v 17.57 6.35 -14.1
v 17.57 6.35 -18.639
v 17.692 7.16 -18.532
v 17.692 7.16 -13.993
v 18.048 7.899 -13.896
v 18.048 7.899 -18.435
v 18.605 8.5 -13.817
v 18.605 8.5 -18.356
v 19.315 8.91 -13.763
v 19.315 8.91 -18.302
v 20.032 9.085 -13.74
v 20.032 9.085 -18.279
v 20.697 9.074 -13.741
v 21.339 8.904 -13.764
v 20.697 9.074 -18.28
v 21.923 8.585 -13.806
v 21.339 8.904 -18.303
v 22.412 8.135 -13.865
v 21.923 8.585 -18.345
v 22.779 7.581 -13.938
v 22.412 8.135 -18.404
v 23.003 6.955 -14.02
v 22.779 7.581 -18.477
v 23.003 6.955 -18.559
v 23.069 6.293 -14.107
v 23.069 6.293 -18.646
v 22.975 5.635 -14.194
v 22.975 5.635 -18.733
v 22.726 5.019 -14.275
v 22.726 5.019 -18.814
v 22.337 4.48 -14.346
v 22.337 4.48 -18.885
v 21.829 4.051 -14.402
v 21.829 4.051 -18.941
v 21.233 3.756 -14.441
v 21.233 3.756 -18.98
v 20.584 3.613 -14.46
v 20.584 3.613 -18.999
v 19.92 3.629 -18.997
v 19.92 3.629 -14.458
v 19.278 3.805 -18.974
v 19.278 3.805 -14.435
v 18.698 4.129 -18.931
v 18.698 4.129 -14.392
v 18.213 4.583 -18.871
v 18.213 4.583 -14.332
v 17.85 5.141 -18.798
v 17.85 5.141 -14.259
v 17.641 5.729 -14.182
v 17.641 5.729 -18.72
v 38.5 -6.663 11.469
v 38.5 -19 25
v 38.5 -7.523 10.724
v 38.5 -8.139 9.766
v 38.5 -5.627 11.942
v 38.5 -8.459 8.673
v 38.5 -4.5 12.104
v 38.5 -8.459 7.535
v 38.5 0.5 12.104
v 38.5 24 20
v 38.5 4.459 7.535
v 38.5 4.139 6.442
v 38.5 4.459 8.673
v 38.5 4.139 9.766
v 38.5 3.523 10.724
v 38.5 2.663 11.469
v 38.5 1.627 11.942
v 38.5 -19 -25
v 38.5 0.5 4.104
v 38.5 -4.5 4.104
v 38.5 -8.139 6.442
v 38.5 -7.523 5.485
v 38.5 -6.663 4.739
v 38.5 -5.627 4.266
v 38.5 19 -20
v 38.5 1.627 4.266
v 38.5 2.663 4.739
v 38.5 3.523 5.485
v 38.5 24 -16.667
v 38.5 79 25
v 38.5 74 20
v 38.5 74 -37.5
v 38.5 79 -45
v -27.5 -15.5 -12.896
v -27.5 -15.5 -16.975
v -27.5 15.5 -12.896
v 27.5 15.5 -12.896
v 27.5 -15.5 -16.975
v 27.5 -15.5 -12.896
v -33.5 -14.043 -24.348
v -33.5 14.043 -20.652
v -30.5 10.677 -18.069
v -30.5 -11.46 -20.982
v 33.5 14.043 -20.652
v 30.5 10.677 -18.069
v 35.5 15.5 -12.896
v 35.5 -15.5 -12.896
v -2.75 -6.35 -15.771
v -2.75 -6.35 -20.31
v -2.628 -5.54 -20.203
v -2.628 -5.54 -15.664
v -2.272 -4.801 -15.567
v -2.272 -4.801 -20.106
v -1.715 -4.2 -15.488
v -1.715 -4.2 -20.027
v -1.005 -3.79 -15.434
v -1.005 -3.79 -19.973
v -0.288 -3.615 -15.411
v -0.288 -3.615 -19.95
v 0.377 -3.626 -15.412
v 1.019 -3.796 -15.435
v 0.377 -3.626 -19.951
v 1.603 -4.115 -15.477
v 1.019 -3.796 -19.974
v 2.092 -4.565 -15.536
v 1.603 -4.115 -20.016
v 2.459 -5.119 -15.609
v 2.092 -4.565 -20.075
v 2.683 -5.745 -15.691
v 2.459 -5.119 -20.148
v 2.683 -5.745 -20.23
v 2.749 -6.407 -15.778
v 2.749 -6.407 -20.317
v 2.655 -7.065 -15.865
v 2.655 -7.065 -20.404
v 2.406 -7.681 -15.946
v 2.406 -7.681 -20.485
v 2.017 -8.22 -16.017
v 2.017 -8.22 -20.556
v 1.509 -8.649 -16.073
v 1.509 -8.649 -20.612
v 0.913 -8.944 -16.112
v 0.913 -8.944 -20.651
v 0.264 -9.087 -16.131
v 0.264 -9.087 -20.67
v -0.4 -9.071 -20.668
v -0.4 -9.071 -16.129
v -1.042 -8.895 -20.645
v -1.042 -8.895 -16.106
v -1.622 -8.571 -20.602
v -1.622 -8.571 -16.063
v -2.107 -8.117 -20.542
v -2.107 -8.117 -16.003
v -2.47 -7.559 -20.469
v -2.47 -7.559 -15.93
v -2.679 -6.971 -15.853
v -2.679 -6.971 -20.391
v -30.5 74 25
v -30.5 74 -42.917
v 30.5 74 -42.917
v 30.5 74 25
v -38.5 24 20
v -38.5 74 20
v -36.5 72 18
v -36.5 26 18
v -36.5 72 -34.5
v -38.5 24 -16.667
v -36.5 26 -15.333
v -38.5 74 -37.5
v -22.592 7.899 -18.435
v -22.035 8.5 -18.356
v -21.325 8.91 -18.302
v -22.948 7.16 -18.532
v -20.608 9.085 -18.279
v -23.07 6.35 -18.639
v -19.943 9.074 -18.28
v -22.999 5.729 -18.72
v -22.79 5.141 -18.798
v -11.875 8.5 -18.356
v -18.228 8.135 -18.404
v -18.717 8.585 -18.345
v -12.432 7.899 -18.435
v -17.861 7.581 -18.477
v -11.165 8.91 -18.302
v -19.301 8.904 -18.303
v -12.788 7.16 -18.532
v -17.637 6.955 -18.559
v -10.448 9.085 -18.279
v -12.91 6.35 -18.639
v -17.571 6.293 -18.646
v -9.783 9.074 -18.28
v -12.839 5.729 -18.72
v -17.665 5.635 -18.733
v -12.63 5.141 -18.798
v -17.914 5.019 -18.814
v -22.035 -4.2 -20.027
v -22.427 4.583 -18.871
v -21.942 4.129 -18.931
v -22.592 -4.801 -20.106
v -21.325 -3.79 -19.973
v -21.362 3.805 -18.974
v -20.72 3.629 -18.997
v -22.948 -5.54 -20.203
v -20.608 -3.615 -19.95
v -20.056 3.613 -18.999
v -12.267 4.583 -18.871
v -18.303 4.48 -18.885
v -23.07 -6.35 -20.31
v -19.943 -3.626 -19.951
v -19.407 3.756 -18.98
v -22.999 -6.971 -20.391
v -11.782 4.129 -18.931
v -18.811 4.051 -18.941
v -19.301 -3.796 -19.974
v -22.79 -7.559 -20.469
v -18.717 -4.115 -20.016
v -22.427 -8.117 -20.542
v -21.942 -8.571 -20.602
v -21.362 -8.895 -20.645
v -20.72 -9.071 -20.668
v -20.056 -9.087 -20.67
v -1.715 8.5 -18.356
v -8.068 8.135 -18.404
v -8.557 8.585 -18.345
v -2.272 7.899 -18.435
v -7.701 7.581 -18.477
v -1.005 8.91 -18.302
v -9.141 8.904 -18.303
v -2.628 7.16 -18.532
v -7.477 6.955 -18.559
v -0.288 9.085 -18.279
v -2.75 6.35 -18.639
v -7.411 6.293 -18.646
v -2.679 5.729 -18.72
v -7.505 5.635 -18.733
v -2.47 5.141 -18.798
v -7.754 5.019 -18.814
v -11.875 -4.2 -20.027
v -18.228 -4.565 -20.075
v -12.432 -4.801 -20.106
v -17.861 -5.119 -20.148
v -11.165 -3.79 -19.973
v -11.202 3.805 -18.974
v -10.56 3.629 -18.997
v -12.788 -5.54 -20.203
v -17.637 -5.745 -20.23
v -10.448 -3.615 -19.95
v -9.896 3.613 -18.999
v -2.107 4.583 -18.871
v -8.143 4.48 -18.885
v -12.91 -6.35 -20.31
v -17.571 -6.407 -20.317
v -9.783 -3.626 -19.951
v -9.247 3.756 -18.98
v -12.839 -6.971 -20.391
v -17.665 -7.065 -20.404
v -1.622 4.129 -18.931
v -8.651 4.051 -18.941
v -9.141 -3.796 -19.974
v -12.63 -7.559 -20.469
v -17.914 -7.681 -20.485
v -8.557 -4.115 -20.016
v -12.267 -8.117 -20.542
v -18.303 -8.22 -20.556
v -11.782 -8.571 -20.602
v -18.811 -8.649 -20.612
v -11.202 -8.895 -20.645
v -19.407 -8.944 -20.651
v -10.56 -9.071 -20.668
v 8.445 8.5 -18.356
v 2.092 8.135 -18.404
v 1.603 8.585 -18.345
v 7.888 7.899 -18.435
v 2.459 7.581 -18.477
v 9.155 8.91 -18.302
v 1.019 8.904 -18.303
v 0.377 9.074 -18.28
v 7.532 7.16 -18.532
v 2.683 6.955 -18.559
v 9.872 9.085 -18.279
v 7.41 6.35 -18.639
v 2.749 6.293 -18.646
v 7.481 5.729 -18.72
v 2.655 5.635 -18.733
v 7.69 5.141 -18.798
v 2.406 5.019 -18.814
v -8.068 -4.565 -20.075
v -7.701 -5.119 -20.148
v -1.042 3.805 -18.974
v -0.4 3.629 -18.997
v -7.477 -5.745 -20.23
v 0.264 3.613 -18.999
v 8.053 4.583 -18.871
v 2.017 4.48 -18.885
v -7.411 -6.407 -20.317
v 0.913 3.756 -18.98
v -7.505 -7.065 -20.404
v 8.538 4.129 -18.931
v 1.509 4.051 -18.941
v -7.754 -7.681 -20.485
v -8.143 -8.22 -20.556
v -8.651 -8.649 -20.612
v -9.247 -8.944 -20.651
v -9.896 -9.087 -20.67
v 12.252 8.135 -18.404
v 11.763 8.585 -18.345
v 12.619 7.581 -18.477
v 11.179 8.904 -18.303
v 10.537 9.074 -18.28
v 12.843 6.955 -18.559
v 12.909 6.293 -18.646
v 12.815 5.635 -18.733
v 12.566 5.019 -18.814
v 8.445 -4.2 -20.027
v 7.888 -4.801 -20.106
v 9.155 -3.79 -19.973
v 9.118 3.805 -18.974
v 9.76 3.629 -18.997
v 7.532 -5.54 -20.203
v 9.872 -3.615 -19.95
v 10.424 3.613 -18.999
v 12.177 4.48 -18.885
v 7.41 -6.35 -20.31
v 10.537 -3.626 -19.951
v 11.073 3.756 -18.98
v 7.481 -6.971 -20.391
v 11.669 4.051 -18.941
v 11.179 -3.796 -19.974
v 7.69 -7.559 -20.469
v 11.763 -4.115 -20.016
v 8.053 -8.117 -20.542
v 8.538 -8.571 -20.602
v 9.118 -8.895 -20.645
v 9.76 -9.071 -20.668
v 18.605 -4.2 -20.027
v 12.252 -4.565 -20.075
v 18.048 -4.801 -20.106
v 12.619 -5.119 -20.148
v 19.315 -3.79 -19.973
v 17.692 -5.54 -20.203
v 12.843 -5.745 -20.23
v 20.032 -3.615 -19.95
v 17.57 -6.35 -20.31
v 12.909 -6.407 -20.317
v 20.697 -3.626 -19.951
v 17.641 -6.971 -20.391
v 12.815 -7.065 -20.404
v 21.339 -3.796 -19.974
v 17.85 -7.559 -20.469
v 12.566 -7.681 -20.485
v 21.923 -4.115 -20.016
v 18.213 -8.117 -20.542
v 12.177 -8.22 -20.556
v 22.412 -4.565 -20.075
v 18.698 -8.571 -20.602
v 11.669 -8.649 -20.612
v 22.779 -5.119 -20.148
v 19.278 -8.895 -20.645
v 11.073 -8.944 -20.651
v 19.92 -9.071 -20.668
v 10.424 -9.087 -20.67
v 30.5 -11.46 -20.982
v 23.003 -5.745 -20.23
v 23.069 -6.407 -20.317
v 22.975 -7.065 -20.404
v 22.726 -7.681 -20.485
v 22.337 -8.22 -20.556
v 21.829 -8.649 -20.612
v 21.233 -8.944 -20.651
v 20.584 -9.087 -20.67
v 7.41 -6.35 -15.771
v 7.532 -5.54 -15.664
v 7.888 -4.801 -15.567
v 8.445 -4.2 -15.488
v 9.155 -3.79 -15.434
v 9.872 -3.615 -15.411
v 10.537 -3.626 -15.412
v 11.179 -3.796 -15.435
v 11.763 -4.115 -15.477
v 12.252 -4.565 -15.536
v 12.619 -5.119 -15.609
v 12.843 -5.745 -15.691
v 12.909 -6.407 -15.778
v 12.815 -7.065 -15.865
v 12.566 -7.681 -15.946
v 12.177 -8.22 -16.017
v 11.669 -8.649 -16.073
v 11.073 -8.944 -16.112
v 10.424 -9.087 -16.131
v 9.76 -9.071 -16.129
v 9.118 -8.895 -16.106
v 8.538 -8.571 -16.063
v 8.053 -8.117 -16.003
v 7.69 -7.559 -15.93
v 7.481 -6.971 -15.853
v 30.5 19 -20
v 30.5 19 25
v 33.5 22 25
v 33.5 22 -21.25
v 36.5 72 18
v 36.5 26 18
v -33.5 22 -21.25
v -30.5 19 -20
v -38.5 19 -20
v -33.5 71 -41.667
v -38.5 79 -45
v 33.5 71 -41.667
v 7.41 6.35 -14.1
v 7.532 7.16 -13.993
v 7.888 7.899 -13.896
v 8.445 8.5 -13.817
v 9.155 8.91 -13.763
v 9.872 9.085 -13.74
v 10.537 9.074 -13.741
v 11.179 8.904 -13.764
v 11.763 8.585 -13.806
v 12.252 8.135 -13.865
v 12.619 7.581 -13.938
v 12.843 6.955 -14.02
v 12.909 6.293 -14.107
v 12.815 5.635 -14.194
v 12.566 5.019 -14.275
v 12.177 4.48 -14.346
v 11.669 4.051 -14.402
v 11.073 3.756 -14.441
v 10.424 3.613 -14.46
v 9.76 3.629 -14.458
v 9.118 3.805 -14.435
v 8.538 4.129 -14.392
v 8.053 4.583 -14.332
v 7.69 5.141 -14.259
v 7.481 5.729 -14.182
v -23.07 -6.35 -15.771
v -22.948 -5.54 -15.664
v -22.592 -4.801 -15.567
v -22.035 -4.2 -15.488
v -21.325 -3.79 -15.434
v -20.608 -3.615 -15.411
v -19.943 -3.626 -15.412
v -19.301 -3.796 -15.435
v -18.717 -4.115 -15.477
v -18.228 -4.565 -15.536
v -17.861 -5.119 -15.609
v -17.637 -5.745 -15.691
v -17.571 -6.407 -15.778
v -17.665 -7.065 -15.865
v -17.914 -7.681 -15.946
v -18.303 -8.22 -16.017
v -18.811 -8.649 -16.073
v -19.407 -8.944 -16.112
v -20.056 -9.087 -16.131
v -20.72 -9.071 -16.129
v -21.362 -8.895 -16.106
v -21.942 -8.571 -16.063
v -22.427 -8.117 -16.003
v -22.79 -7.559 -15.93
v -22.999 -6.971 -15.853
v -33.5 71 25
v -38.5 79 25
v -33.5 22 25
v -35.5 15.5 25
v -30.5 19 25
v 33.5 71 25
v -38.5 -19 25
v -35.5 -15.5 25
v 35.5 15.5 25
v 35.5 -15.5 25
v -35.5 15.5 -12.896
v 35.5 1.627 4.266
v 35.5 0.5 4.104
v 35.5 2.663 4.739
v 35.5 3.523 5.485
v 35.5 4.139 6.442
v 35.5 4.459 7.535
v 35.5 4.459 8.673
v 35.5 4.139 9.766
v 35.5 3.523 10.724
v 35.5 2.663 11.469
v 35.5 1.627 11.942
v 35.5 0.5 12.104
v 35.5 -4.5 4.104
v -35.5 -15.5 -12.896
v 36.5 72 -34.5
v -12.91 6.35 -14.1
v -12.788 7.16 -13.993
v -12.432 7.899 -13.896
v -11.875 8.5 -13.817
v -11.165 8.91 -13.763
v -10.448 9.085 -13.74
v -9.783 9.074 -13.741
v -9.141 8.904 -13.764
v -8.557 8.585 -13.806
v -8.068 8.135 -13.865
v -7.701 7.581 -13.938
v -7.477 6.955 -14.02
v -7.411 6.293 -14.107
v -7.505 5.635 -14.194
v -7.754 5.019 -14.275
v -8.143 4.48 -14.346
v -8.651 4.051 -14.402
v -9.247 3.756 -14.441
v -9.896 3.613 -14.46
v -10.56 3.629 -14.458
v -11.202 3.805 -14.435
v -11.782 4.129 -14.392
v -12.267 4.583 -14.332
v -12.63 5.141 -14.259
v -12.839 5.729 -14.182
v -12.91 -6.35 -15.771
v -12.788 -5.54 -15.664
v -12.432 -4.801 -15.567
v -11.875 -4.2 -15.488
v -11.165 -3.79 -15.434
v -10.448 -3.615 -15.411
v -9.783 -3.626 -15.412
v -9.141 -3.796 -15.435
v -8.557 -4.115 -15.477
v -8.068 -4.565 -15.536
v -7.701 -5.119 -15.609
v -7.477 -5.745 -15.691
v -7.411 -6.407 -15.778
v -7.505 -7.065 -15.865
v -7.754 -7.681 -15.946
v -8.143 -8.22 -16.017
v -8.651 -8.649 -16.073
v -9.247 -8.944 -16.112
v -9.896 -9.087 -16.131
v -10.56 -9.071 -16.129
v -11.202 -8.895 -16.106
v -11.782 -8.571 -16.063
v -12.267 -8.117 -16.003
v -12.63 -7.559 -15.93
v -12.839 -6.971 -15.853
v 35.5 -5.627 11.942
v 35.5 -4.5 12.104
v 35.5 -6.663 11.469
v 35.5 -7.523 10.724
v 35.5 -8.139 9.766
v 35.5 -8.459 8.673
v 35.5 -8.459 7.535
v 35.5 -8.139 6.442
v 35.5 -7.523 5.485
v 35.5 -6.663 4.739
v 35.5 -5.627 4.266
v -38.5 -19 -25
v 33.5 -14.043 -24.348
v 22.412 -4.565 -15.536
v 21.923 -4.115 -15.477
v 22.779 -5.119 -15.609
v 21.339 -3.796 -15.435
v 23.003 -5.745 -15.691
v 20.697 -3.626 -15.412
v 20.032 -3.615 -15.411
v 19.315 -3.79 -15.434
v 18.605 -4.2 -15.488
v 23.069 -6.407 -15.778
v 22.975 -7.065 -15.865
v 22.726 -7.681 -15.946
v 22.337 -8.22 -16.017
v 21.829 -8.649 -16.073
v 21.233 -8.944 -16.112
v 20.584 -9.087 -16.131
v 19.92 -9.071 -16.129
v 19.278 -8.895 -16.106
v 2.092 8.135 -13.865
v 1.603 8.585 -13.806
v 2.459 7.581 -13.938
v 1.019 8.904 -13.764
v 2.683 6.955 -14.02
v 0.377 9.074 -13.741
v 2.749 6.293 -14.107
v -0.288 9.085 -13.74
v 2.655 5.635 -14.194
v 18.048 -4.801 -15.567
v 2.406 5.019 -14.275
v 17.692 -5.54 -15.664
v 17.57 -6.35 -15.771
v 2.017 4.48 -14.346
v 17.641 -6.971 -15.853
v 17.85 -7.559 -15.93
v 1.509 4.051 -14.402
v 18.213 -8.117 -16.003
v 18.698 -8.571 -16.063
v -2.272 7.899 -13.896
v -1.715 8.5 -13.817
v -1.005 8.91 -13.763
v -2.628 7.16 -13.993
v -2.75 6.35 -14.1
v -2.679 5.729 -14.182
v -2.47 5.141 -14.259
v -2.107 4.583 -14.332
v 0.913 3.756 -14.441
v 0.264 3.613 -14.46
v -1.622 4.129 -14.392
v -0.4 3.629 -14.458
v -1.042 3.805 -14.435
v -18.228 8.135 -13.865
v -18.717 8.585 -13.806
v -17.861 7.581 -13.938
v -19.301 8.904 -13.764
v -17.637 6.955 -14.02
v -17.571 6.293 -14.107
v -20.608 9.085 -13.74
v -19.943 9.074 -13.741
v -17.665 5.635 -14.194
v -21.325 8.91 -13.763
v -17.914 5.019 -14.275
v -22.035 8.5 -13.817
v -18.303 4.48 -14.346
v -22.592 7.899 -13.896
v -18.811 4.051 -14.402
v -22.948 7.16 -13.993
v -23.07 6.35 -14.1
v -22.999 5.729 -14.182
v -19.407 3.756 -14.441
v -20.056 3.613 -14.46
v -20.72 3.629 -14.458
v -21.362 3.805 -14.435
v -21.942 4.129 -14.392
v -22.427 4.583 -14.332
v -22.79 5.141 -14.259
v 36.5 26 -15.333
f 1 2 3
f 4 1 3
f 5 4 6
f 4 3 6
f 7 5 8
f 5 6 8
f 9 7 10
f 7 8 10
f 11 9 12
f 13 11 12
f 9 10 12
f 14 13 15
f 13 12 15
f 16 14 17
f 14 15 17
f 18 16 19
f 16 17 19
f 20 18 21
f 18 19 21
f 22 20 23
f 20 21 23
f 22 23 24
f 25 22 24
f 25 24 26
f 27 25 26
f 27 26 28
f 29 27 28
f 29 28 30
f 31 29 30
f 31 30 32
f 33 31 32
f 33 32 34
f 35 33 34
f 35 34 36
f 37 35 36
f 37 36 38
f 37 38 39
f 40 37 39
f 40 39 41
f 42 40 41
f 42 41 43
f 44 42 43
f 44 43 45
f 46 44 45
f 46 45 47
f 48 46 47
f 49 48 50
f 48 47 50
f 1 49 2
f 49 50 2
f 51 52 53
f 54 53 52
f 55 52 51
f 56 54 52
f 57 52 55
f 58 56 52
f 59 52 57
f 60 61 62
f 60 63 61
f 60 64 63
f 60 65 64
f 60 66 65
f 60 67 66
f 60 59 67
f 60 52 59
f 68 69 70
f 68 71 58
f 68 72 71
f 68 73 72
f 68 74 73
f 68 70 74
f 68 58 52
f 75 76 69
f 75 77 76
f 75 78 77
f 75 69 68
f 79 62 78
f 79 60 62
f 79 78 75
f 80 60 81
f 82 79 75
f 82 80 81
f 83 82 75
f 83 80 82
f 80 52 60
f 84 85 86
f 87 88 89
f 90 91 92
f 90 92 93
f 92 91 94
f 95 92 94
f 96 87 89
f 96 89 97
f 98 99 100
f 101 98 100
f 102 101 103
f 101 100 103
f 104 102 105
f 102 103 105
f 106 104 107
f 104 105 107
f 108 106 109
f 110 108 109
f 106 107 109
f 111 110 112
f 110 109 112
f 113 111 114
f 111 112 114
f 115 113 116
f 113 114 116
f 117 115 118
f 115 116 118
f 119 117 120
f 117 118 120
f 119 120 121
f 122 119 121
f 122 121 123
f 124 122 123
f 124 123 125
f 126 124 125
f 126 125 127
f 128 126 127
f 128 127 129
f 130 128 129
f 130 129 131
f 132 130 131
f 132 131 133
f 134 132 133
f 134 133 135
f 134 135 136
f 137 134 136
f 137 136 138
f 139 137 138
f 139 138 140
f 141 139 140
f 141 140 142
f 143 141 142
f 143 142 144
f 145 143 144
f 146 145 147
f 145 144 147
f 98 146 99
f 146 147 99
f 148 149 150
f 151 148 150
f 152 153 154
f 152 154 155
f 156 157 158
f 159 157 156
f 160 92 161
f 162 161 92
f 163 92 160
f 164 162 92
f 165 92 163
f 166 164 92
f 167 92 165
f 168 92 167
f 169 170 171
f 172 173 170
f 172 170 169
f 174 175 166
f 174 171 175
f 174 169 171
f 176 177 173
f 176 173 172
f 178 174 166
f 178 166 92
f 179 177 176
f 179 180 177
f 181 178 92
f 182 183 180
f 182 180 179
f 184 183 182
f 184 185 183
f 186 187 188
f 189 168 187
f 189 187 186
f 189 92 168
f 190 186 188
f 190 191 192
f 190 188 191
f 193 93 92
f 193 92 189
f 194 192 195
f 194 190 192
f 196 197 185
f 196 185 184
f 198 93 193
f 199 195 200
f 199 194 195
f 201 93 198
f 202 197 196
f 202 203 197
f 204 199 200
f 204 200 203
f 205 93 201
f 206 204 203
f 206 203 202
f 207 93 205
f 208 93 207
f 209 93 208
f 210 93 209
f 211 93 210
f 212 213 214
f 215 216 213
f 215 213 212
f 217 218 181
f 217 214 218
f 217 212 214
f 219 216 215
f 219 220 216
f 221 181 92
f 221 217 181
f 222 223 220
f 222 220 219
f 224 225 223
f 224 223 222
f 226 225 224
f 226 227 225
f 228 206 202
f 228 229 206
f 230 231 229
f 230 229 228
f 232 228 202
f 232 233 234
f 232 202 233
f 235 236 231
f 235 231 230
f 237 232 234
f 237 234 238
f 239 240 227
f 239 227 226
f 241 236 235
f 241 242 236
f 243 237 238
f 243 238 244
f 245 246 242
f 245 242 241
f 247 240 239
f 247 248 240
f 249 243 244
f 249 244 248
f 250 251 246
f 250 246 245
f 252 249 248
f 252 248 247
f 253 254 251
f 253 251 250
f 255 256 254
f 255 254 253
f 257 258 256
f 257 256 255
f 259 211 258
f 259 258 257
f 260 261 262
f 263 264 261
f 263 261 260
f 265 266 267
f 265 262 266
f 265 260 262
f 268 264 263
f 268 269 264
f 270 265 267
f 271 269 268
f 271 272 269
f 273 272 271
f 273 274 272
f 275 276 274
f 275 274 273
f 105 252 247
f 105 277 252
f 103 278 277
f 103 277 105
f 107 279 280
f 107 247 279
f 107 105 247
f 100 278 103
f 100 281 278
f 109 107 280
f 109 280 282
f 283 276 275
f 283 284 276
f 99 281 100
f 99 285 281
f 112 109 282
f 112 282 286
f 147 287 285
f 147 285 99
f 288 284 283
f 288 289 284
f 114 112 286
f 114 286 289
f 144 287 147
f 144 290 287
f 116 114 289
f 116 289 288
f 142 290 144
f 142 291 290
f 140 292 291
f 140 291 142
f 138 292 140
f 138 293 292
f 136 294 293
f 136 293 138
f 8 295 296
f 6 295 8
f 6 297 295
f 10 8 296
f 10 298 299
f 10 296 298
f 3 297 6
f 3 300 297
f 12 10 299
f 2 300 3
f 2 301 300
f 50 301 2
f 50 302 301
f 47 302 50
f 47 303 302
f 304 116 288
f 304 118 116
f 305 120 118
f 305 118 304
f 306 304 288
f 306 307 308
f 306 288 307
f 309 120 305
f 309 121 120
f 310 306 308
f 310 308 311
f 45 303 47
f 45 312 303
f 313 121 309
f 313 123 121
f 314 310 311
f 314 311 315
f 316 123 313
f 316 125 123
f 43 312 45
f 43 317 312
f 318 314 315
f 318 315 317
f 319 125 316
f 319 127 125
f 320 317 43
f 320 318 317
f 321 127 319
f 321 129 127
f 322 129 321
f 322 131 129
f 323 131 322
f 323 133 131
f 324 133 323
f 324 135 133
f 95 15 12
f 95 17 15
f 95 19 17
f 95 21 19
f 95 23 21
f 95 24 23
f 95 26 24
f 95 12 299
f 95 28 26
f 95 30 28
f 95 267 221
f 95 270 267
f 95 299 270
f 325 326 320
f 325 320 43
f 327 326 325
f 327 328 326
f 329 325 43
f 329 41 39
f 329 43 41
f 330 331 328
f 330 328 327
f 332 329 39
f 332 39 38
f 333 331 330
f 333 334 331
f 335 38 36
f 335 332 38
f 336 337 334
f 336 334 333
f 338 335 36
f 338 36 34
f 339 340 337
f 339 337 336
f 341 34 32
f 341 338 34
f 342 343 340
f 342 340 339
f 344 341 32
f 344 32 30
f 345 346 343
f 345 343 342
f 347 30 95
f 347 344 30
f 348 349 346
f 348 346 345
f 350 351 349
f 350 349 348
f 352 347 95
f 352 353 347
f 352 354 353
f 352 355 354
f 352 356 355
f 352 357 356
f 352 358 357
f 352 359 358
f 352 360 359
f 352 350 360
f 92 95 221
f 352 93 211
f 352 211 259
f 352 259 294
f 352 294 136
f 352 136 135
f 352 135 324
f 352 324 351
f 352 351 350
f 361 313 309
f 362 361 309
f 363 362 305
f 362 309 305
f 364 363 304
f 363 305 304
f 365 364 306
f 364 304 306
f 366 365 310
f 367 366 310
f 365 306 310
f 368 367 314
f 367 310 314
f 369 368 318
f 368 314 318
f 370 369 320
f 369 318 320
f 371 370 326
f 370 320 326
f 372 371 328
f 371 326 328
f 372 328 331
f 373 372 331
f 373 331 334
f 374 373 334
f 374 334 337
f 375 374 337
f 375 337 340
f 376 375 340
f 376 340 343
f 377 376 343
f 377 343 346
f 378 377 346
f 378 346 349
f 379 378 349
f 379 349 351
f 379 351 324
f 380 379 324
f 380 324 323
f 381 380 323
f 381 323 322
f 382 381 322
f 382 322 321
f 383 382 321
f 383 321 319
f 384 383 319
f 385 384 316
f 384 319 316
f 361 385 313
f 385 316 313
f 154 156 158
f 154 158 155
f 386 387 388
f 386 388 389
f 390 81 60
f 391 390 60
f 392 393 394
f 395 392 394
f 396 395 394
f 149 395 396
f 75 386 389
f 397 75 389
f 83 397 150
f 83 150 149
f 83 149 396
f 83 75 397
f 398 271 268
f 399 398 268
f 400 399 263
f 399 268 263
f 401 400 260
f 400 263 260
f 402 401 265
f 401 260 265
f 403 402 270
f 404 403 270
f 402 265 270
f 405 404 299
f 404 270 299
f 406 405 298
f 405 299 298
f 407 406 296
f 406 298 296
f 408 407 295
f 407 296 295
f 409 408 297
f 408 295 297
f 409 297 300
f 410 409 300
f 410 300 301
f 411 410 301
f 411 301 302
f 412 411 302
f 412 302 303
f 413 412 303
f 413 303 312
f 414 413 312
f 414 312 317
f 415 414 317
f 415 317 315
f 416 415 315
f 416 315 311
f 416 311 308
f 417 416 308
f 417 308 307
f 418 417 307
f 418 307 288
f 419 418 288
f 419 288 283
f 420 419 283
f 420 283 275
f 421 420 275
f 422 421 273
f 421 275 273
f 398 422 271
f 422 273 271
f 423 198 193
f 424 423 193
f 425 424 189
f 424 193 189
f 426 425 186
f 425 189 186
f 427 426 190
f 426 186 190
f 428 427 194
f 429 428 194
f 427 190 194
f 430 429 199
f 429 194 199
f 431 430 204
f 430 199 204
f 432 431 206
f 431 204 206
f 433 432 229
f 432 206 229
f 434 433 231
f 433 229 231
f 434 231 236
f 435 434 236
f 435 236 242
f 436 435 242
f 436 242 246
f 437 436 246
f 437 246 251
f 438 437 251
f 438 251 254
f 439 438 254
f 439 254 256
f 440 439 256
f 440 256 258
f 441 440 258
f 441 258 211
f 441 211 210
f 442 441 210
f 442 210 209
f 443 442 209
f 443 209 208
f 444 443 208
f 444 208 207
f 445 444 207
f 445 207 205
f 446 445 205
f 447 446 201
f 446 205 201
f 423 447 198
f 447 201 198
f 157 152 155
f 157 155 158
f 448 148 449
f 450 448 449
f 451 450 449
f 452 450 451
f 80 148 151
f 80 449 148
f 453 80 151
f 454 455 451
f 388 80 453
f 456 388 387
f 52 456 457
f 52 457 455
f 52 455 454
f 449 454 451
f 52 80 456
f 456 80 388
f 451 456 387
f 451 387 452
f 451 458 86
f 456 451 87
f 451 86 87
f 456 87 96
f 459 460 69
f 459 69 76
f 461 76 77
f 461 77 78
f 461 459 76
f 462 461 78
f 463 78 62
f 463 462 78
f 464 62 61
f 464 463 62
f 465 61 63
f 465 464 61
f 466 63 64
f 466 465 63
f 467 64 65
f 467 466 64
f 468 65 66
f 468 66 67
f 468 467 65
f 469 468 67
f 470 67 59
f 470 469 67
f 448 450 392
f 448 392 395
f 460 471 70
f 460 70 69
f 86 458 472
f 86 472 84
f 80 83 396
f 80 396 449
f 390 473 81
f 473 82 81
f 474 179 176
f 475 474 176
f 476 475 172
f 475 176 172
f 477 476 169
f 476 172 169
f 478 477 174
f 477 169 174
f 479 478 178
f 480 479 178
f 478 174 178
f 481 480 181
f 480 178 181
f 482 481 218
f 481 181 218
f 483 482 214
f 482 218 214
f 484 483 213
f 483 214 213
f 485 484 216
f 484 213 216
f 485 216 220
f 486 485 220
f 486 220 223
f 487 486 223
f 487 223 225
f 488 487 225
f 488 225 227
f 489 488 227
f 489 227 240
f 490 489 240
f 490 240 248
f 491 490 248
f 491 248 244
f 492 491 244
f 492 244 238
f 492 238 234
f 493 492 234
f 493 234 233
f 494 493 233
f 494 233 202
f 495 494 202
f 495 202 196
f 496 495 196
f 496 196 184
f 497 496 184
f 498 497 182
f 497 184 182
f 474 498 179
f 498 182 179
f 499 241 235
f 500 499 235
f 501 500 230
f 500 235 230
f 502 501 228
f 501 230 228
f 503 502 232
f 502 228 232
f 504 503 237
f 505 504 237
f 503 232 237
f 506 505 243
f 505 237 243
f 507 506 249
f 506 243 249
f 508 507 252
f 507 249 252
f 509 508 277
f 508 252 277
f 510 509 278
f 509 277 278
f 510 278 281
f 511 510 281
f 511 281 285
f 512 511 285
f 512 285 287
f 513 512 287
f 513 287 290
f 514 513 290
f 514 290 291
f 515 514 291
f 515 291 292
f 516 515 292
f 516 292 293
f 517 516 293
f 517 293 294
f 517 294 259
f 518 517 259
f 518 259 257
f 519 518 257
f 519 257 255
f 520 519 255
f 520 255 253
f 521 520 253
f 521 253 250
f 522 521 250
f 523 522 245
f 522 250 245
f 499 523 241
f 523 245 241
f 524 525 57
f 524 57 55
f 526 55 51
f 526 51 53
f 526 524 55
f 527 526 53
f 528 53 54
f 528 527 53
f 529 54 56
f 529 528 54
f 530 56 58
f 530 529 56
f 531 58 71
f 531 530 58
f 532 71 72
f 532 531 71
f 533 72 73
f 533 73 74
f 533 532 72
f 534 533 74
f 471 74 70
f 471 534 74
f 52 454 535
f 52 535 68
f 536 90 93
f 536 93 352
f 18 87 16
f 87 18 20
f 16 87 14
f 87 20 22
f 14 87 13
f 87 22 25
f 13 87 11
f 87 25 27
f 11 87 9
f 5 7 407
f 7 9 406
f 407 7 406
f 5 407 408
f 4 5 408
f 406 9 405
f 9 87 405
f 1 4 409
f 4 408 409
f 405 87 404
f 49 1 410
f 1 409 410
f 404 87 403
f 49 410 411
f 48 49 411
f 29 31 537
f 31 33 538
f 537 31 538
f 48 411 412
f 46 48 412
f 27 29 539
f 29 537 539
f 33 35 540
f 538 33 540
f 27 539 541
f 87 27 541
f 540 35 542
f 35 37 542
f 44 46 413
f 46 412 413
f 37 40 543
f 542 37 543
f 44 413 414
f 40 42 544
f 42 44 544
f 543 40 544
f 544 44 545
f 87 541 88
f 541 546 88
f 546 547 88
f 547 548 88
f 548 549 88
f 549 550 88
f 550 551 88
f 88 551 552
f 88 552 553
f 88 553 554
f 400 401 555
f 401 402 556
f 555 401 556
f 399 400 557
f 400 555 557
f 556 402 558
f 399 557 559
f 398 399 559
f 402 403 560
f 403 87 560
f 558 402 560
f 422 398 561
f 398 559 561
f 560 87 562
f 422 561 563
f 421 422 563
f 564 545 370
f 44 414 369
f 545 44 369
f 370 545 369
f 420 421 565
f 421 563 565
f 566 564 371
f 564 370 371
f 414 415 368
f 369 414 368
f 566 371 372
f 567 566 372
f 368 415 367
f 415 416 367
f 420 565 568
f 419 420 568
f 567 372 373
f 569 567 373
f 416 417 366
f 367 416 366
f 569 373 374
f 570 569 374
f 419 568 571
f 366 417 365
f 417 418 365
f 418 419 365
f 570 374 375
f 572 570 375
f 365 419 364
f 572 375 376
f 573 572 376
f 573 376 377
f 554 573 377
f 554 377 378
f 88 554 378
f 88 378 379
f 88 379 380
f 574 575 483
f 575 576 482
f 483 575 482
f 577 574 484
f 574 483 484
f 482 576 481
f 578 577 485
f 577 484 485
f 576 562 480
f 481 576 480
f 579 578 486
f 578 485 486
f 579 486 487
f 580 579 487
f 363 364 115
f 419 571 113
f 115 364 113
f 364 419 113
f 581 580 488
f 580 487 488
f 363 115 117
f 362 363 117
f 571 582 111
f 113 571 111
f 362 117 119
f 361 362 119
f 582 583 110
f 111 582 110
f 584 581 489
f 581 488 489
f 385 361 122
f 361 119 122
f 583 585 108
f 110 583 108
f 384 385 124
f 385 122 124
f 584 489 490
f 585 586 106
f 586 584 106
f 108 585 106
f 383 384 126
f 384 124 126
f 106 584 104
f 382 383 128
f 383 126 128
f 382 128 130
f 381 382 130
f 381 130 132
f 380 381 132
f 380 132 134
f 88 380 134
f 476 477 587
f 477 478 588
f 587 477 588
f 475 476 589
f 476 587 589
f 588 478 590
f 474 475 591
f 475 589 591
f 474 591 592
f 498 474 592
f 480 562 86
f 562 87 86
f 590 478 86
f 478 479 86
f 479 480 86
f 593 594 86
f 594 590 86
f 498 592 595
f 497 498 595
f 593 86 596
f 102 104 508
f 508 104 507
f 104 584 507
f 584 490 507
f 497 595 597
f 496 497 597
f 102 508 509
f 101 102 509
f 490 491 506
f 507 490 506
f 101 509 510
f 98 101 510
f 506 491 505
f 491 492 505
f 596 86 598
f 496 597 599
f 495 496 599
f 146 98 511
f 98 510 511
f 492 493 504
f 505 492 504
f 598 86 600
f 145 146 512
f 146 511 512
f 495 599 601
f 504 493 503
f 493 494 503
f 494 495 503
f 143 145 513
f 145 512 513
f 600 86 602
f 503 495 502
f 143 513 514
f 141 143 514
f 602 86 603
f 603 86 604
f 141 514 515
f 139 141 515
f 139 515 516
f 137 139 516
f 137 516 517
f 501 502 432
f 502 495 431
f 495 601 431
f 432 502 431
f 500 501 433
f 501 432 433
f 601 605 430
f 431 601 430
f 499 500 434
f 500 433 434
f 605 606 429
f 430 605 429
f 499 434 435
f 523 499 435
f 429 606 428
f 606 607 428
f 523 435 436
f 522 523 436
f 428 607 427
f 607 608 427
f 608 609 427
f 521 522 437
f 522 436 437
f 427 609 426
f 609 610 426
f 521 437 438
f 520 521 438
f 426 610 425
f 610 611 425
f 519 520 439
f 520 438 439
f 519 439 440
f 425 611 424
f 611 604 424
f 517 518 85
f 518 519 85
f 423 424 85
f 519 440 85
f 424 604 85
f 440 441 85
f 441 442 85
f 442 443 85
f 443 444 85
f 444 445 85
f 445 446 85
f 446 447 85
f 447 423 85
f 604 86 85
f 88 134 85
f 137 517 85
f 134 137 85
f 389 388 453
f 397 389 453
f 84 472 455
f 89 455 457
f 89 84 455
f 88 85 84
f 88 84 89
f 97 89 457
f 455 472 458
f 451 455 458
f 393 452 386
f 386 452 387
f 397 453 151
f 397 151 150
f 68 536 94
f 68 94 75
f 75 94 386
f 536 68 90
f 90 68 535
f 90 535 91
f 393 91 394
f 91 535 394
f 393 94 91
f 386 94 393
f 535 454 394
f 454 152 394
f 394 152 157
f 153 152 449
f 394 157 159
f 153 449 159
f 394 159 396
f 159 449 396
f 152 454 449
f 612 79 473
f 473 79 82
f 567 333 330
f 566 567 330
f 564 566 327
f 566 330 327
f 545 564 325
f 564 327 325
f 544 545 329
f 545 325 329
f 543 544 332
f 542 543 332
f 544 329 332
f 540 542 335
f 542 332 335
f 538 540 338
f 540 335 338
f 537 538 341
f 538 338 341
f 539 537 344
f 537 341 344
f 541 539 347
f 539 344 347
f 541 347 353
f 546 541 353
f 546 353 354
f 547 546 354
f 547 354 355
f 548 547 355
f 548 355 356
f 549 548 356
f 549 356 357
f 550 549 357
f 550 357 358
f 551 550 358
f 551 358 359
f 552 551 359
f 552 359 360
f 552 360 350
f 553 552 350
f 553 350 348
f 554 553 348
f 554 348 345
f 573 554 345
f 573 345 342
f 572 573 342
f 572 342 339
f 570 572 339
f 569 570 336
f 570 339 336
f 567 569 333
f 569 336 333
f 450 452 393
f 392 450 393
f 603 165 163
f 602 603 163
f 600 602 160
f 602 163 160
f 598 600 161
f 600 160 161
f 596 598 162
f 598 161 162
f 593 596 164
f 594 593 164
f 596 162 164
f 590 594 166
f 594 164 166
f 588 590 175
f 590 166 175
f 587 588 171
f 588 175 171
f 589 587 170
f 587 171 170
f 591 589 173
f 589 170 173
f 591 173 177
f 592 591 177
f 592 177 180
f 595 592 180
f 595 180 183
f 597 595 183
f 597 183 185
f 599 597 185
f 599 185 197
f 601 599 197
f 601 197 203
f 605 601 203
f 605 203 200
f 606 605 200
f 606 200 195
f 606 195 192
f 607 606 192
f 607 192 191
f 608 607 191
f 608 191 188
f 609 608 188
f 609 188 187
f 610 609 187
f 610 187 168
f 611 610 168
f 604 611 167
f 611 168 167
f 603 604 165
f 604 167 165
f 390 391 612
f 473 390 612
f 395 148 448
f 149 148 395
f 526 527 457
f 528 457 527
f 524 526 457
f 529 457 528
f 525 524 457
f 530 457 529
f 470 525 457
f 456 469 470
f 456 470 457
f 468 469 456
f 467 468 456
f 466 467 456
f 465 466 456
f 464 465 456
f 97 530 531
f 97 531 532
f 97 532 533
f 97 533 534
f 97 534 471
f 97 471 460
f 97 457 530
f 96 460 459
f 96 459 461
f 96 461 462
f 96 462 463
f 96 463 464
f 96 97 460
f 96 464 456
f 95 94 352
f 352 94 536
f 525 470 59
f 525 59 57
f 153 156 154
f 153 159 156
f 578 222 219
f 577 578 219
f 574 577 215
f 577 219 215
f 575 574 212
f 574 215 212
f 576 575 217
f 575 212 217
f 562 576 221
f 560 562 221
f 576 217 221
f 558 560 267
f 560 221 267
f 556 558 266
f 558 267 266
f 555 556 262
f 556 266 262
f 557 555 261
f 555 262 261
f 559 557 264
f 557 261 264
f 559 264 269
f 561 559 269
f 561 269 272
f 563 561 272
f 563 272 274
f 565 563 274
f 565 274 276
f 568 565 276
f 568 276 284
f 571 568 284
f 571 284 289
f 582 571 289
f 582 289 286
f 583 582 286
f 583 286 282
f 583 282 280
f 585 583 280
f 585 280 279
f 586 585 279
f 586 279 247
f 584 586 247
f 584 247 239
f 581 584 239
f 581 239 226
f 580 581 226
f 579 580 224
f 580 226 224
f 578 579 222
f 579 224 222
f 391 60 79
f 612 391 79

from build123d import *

# Parameters (mm, degrees)
SKIZZE1_W                                   = 77
SKIZZE1_H                                   = 38
AUFSATZ_LINEAR_AUSTRAGEN1_DEPTH             = 25
SKIZZE5_R                                   = 2.75
SCHNITT_LINEAR_AUSTRAGEN1_DEPTH             = 66.903338307
SCHNITT_LINEAR_AUSTRAGEN2_DEPTH             = 50.681485485
SCHNITT_LINEAR_AUSTRAGEN2_DEPTH_BACK        = 50.681485485
SKIZZE8_W                                   = 67
SKIZZE8_H                                   = 28.327535794
SCHNITT_LINEAR_AUSTRAGEN8_DEPTH             = 3
SCHNITT_LINEAR_AUSTRAGEN8_DRAFT             = -45
SKIZZE9_W                                   = 71
SKIZZE9_H                                   = 31
SCHNITT_LINEAR_AUSTRAGEN9_DEPTH             = 50.681485485
SCHNITT_LINEAR_AUSTRAGEN9_DIRECTION_2_REACH = 51.681
AUFSATZ_LINEAR_START                        = -16.974828462
AUFSATZ_LINEAR_AUSTRAGEN2_OUTLINE_W         = 8
AUFSATZ_LINEAR_AUSTRAGEN2_OUTLINE_H         = 31
AUFSATZ_LINEAR_AUSTRAGEN2_DEPTH             = 4.078947369
AUFSATZ_LINEAR_AUSTRAGEN4_DEPTH             = 77
SKIZZE23_W                                  = 67
SKIZZE23_H                                  = 55
SCHNITT_LINEAR_AUSTRAGEN19_DEPTH            = 113.353237604
SCHNITT_LINEAR_AUSTRAGEN20_DEPTH            = 2
SCHNITT_LINEAR_AUSTRAGEN20_DRAFT            = -45
SPIEGELN9_COPY_1_DEPTH                      = 2
SPIEGELN9_COPY_1_DRAFT                      = -45
FASE2_SIZE                                  = 3
SCHNITT_LINEAR_AUSTRAGEN21_DEPTH            = 3


# Read off the part's stored shape, not the designer's step: Aufsatz-Linear austragen2
with BuildPart() as part:
    # Skizze1 → Aufsatz-Linear austragen1 (new, symmetric)
    with BuildSketch(Plane.XY):
        Rectangle(SKIZZE1_W, SKIZZE1_H)
    extrude(amount=AUFSATZ_LINEAR_AUSTRAGEN1_DEPTH, both=True)

    # Skizze5 → Schnitt-Linear austragen1 (cut, through all)
    with BuildSketch(Plane(origin=(0, 0, -25), x_dir=(-1, 0, 0), z_dir=(0, 0, -1))):
        with Locations((-20.32, 6.35)):
            Circle(SKIZZE5_R)
        with Locations((-20.32, -6.35)):
            Circle(SKIZZE5_R)
        with Locations((-10.16, 6.35)):
            Circle(SKIZZE5_R)
        with Locations((-10.16, -6.35)):
            Circle(SKIZZE5_R)
        with Locations((0, 6.35)):
            Circle(SKIZZE5_R)
        with Locations((0, -6.35)):
            Circle(SKIZZE5_R)
        with Locations((10.16, 6.35)):
            Circle(SKIZZE5_R)
        with Locations((10.16, -6.35)):
            Circle(SKIZZE5_R)
        with Locations((20.32, 6.35)):
            Circle(SKIZZE5_R)
        with Locations((20.32, -6.35)):
            Circle(SKIZZE5_R)
    extrude(amount=-SCHNITT_LINEAR_AUSTRAGEN1_DEPTH, mode=Mode.SUBTRACT)

    # Skizze6 → Schnitt-Linear austragen2 (cut, two sides: drawn at the far end of the back side and taken through both)
    with BuildSketch(Plane(origin=(0, 0, 0), x_dir=(0, 0, -1), z_dir=(1, 0, 0)).offset(-SCHNITT_LINEAR_AUSTRAGEN2_DEPTH_BACK)):
        Polygon((20, 19), (25, 19), (25, -19), align=None)
    extrude(amount=SCHNITT_LINEAR_AUSTRAGEN2_DEPTH + SCHNITT_LINEAR_AUSTRAGEN2_DEPTH_BACK, mode=Mode.SUBTRACT)


with BuildPart() as schnitt_linear_austragen8_tool:
    # Skizze8 → Schnitt-Linear austragen8 (with draft: the straight prism first)
    with BuildSketch(Plane(origin=(0, 2.910142954, -22.117086453), x_dir=(1, 0, 0), z_dir=(0, 0.1304545125713874, -0.9914542955425438))):
        with Locations((0, 2.935226533)):
            Rectangle(SKIZZE8_W, SKIZZE8_H)
    extrude(amount=-SCHNITT_LINEAR_AUSTRAGEN8_DEPTH)
    # Schnitt-Linear austragen8: the draft: its side faces are tilted about the plane it starts from
    schnitt_linear_austragen8_sides = [schnitt_linear_austragen8_tool.faces().sort_by_distance(p)[0] for p in [
        (-33.5, -0.195681769, -21.012818557),
        (0, 13.847046753, -19.16509112),
        (33.5, -0.195681769, -21.012818557),
        (0, -14.238410291, -22.860545994),
    ]]
    draft(schnitt_linear_austragen8_sides, Plane(origin=(0, 2.910142954, -22.117086453), x_dir=(1, 0, 0), z_dir=(0, 0.1304545125713874, -0.9914542955425438)), SCHNITT_LINEAR_AUSTRAGEN8_DRAFT)


with BuildPart() as part_1:
    add(part.part)

    # Schnitt-Linear austragen8: cut by schnitt_linear_austragen8_tool
    add(schnitt_linear_austragen8_tool.part, mode=Mode.SUBTRACT)

    # Skizze9 → Schnitt-Linear austragen9 (cut)
    with BuildSketch(Plane.XY):
        Rectangle(SKIZZE9_W, SKIZZE9_H)
    extrude(amount=SCHNITT_LINEAR_AUSTRAGEN9_DEPTH, mode=Mode.SUBTRACT)

    # Schnitt-Linear austragen9 direction 2: up to this plane
    schnitt_linear_austragen9_direction_2_end = Plane(origin=(0, 1.93173411, -14.681179237), z_dir=(0, 0.13045451257138746, -0.9914542955425438))
    # Skizze9 → Schnitt-Linear austragen9 direction 2 (cut, up to the surface)
    with BuildSketch(Plane.XY, mode=Mode.PRIVATE) as schnitt_linear_austragen9_direction_2_sk1:
        Rectangle(SKIZZE9_W, SKIZZE9_H)
    schnitt_linear_austragen9_direction_2_tool1 = split(extrude(schnitt_linear_austragen9_direction_2_sk1.sketch, amount=-SCHNITT_LINEAR_AUSTRAGEN9_DIRECTION_2_REACH, mode=Mode.PRIVATE), bisect_by=schnitt_linear_austragen9_direction_2_end, keep=Keep.BOTH, mode=Mode.PRIVATE)
    add(schnitt_linear_austragen9_direction_2_tool1.solids().sort_by_distance((0, 0, 0))[0], mode=Mode.SUBTRACT)

    # Aufsatz-Linear austragen2 outline → Aufsatz-Linear austragen2 (add)
    with BuildSketch(Plane.XY.offset(AUFSATZ_LINEAR_START)):
        with Locations((-31.5, 0)):
            Rectangle(AUFSATZ_LINEAR_AUSTRAGEN2_OUTLINE_W, AUFSATZ_LINEAR_AUSTRAGEN2_OUTLINE_H)
        with Locations((31.5, 0)):
            Rectangle(AUFSATZ_LINEAR_AUSTRAGEN2_OUTLINE_W, AUFSATZ_LINEAR_AUSTRAGEN2_OUTLINE_H)
    extrude(amount=AUFSATZ_LINEAR_AUSTRAGEN2_DEPTH)

    # Skizze22 → Aufsatz-Linear austragen4 (add)
    with BuildSketch(Plane(origin=(38.5, 0, 0), x_dir=(0, 0, -1), z_dir=(1, 0, 0))):
        Polygon((20, 19), (45, 79), (-25, 79), (-25, 19), align=None)
    extrude(amount=-AUFSATZ_LINEAR_AUSTRAGEN4_DEPTH)

    # Skizze23 → Schnitt-Linear austragen19 (cut, through all)
    with BuildSketch(Plane.XY.offset(25)):
        with Locations((0, 46.5)):
            Rectangle(SKIZZE23_W, SKIZZE23_H)
    extrude(amount=-SCHNITT_LINEAR_AUSTRAGEN19_DEPTH, mode=Mode.SUBTRACT)


with BuildPart() as schnitt_linear_austragen20_tool:
    # Skizze24 → Schnitt-Linear austragen20 (with draft: the straight prism first)
    with BuildSketch(Plane(origin=(38.5, 0, 0), x_dir=(0, 0, -1), z_dir=(1, 0, 0))):
        Polygon((16.666666667, 24), (37.5, 74), (-20, 74), (-20, 24), align=None)
    extrude(amount=-SCHNITT_LINEAR_AUSTRAGEN20_DEPTH)
    # Schnitt-Linear austragen20: the draft: its side faces are tilted about the plane it starts from
    schnitt_linear_austragen20_sides = [schnitt_linear_austragen20_tool.faces().sort_by_distance(p)[0] for p in [
        (37.5, 49, -27.083333333),
        (37.5, 74, -8.75),
        (37.5, 49, 20),
        (37.5, 24, 1.666666667),
    ]]
    draft(schnitt_linear_austragen20_sides, Plane(origin=(38.5, 0, 0), x_dir=(0, 0, -1), z_dir=(1, 0, 0)), SCHNITT_LINEAR_AUSTRAGEN20_DRAFT)


with BuildPart() as part_2:
    add(part_1.part)

    # Schnitt-Linear austragen20: cut by schnitt_linear_austragen20_tool
    add(schnitt_linear_austragen20_tool.part, mode=Mode.SUBTRACT)


with BuildPart() as spiegeln9_copy_1_tool:
    # Spiegeln9 copy 1 sketch → Spiegeln9 copy 1 (with draft: the straight prism first)
    with BuildSketch(Plane(origin=(-38.5, 0, 0), x_dir=(0, 0, -1), z_dir=(-1, 0, 0))):
        Polygon((16.666666667, -24), (37.5, -74), (-20, -74), (-20, -24), align=None)
    extrude(amount=-SPIEGELN9_COPY_1_DEPTH)
    # Spiegeln9 copy 1: the draft: its side faces are tilted about the plane it starts from
    spiegeln9_copy_1_sides = [spiegeln9_copy_1_tool.faces().sort_by_distance(p)[0] for p in [
        (-37.5, 49, -27.083333333),
        (-37.5, 74, -8.75),
        (-37.5, 49, 20),
        (-37.5, 24, 1.666666667),
    ]]
    draft(spiegeln9_copy_1_sides, Plane(origin=(-38.5, 0, 0), x_dir=(0, 0, -1), z_dir=(-1, 0, 0)), SPIEGELN9_COPY_1_DRAFT)


with BuildPart() as part_3:
    add(part_2.part)

    # Spiegeln9 copy 1: cut by spiegeln9_copy_1_tool
    add(spiegeln9_copy_1_tool.part, mode=Mode.SUBTRACT)

    # Fase2
    fase2_edges = [part_3.edges().sort_by_distance(p)[0] for p in [
        (33.5, 74, -8.958333333),
        (33.5, 19, 2.5),
        (-33.5, 19, 2.5),
        (-33.5, 74, -8.958333333),
    ]]
    chamfer(fase2_edges, length=FASE2_SIZE)

    # Skizze25 → Schnitt-Linear austragen21 (cut)
    with BuildSketch(Plane.ZY.offset(-35.5)):
        with BuildLine():
            Line((4.104118907, -4.5), (4.104118907, 0.5))
            ThreePointArc((4.104118907, 0.5), (8.104118907, 4.5), (12.104118907, 0.5))
            Line((12.104118907, 0.5), (12.104118907, -4.5))
            ThreePointArc((12.104118907, -4.5), (8.104118907, -8.5), (4.104118907, -4.5))
        make_face()
    extrude(amount=-SCHNITT_LINEAR_AUSTRAGEN21_DEPTH, mode=Mode.SUBTRACT)


solid = part_3.part
